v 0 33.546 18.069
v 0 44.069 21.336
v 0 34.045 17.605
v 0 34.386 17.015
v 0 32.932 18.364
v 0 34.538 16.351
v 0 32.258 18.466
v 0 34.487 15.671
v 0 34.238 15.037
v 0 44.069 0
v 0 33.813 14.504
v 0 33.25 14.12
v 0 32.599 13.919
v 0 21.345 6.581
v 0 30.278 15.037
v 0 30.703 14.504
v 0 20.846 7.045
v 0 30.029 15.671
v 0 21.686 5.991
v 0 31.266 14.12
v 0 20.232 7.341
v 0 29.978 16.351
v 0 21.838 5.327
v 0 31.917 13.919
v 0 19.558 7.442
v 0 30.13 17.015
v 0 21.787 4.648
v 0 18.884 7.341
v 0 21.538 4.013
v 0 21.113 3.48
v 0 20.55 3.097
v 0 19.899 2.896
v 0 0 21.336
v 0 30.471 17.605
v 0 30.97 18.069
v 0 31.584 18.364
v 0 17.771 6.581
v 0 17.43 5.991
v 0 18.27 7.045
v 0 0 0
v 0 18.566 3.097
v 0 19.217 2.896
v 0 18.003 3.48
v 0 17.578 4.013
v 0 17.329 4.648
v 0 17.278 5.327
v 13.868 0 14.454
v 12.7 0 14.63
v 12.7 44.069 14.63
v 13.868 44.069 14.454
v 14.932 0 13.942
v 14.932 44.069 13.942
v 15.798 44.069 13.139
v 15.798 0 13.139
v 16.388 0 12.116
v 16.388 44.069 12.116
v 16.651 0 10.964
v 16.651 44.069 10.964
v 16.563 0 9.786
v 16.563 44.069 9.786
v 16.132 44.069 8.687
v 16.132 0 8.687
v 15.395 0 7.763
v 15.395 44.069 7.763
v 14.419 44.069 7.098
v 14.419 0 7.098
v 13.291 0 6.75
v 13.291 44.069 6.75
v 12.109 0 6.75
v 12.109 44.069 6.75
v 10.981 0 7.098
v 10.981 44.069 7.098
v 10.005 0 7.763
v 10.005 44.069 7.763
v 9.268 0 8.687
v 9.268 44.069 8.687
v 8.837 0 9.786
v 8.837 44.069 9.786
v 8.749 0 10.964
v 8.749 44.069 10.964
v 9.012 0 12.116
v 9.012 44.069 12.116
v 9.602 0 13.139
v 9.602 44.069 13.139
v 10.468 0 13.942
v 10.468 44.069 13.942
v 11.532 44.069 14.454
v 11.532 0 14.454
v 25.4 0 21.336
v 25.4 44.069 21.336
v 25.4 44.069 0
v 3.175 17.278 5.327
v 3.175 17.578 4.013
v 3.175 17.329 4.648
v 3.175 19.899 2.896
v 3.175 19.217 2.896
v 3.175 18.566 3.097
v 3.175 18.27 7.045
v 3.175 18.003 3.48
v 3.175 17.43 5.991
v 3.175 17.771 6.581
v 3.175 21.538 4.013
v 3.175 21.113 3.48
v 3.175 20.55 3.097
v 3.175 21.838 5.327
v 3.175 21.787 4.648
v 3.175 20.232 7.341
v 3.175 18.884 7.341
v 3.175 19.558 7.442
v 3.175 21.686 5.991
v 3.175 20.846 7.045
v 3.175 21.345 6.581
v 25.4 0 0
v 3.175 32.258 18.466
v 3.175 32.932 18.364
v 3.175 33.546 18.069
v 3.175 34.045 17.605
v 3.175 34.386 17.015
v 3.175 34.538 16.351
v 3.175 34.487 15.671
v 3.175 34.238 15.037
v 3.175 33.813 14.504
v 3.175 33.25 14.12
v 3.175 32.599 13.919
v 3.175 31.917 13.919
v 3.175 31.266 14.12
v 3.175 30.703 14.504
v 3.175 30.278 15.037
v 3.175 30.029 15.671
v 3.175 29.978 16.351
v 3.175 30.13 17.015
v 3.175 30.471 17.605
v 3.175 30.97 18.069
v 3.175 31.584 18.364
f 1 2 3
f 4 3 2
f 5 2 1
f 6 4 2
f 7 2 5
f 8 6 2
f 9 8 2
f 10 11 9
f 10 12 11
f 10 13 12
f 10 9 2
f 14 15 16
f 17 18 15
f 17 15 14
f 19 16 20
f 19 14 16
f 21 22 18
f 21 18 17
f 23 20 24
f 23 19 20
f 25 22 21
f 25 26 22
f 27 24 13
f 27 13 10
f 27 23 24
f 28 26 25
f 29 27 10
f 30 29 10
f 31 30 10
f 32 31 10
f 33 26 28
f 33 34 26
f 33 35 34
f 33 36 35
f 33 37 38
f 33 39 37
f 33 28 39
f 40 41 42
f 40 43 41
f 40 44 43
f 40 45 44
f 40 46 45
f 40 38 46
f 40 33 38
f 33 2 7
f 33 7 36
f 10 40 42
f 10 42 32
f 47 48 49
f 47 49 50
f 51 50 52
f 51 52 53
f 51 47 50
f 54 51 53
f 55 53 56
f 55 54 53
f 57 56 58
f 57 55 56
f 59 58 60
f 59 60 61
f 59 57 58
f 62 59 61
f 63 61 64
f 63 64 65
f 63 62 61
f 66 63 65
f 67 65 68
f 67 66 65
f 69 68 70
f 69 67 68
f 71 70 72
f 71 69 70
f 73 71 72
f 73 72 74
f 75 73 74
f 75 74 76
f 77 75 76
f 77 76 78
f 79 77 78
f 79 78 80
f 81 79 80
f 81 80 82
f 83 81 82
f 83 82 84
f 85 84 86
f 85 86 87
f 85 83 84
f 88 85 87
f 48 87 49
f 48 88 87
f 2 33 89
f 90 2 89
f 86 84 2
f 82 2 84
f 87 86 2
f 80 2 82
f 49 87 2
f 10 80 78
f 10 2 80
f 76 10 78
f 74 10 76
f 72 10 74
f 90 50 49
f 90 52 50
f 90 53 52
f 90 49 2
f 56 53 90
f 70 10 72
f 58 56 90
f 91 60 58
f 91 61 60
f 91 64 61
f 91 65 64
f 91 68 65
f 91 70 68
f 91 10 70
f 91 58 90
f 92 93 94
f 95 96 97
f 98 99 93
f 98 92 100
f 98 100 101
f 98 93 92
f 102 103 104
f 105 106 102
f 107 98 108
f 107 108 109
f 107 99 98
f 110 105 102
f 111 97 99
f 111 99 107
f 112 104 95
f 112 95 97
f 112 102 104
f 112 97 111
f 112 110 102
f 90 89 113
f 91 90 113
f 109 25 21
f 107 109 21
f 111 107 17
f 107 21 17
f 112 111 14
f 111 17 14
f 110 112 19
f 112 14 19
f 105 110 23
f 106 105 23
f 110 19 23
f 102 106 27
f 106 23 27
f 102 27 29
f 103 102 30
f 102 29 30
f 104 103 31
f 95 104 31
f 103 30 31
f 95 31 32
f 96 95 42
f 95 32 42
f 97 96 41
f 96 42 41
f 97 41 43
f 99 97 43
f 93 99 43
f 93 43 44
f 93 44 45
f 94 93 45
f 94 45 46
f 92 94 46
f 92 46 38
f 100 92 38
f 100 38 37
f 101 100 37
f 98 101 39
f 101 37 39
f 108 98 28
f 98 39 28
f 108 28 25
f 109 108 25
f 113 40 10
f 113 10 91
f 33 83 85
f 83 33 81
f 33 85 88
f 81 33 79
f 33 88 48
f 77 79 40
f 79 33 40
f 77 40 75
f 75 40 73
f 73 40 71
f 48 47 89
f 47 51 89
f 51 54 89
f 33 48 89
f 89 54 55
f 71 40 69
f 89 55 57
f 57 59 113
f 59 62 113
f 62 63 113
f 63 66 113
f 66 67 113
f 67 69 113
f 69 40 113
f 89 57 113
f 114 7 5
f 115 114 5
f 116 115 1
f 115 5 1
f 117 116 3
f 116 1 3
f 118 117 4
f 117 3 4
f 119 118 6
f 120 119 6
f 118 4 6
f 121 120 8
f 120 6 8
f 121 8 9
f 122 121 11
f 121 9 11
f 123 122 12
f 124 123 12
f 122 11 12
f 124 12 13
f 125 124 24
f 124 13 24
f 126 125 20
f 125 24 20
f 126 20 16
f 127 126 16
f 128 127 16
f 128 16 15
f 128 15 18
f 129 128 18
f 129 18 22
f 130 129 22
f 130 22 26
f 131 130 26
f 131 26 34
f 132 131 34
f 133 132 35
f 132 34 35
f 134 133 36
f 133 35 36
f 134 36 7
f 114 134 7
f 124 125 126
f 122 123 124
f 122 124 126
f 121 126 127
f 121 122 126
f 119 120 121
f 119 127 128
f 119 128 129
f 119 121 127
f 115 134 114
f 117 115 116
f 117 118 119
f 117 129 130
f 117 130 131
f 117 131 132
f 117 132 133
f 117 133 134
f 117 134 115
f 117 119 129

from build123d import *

# Parameters (mm, degrees)
SKETCH1_W           = 25.4
SKETCH1_H           = 21.336
SKETCH1_R           = 3.9624
BOSS_EXTRUDE1_DEPTH = 44.069
SKETCH3_R           = 2.286
CUT_EXTRUDE2_DEPTH  = 3.175


with BuildPart() as part:
    # Sketch1 → Boss-Extrude1 (new body)
    with BuildSketch(Plane(origin=(0, 0, 0), x_dir=(1, 0, 0), z_dir=(0, 1, 0))):
        with Locations((12.7, -10.668)):
            Rectangle(SKETCH1_W, SKETCH1_H)
        with Locations(Location((12.7, -10.668, 0), (0, 0, 270))):
            Circle(SKETCH1_R, mode=Mode.SUBTRACT)
    extrude(amount=BOSS_EXTRUDE1_DEPTH)

    # Sketch3 → Cut-Extrude2 (cut)
    with BuildSketch(Plane.ZY):
        with Locations((16.1798, 32.258)):
            Circle(SKETCH3_R)
        with Locations((5.1562, 19.558)):
            Circle(SKETCH3_R)
    extrude(amount=-CUT_EXTRUDE2_DEPTH, mode=Mode.SUBTRACT)


solid = part.part
